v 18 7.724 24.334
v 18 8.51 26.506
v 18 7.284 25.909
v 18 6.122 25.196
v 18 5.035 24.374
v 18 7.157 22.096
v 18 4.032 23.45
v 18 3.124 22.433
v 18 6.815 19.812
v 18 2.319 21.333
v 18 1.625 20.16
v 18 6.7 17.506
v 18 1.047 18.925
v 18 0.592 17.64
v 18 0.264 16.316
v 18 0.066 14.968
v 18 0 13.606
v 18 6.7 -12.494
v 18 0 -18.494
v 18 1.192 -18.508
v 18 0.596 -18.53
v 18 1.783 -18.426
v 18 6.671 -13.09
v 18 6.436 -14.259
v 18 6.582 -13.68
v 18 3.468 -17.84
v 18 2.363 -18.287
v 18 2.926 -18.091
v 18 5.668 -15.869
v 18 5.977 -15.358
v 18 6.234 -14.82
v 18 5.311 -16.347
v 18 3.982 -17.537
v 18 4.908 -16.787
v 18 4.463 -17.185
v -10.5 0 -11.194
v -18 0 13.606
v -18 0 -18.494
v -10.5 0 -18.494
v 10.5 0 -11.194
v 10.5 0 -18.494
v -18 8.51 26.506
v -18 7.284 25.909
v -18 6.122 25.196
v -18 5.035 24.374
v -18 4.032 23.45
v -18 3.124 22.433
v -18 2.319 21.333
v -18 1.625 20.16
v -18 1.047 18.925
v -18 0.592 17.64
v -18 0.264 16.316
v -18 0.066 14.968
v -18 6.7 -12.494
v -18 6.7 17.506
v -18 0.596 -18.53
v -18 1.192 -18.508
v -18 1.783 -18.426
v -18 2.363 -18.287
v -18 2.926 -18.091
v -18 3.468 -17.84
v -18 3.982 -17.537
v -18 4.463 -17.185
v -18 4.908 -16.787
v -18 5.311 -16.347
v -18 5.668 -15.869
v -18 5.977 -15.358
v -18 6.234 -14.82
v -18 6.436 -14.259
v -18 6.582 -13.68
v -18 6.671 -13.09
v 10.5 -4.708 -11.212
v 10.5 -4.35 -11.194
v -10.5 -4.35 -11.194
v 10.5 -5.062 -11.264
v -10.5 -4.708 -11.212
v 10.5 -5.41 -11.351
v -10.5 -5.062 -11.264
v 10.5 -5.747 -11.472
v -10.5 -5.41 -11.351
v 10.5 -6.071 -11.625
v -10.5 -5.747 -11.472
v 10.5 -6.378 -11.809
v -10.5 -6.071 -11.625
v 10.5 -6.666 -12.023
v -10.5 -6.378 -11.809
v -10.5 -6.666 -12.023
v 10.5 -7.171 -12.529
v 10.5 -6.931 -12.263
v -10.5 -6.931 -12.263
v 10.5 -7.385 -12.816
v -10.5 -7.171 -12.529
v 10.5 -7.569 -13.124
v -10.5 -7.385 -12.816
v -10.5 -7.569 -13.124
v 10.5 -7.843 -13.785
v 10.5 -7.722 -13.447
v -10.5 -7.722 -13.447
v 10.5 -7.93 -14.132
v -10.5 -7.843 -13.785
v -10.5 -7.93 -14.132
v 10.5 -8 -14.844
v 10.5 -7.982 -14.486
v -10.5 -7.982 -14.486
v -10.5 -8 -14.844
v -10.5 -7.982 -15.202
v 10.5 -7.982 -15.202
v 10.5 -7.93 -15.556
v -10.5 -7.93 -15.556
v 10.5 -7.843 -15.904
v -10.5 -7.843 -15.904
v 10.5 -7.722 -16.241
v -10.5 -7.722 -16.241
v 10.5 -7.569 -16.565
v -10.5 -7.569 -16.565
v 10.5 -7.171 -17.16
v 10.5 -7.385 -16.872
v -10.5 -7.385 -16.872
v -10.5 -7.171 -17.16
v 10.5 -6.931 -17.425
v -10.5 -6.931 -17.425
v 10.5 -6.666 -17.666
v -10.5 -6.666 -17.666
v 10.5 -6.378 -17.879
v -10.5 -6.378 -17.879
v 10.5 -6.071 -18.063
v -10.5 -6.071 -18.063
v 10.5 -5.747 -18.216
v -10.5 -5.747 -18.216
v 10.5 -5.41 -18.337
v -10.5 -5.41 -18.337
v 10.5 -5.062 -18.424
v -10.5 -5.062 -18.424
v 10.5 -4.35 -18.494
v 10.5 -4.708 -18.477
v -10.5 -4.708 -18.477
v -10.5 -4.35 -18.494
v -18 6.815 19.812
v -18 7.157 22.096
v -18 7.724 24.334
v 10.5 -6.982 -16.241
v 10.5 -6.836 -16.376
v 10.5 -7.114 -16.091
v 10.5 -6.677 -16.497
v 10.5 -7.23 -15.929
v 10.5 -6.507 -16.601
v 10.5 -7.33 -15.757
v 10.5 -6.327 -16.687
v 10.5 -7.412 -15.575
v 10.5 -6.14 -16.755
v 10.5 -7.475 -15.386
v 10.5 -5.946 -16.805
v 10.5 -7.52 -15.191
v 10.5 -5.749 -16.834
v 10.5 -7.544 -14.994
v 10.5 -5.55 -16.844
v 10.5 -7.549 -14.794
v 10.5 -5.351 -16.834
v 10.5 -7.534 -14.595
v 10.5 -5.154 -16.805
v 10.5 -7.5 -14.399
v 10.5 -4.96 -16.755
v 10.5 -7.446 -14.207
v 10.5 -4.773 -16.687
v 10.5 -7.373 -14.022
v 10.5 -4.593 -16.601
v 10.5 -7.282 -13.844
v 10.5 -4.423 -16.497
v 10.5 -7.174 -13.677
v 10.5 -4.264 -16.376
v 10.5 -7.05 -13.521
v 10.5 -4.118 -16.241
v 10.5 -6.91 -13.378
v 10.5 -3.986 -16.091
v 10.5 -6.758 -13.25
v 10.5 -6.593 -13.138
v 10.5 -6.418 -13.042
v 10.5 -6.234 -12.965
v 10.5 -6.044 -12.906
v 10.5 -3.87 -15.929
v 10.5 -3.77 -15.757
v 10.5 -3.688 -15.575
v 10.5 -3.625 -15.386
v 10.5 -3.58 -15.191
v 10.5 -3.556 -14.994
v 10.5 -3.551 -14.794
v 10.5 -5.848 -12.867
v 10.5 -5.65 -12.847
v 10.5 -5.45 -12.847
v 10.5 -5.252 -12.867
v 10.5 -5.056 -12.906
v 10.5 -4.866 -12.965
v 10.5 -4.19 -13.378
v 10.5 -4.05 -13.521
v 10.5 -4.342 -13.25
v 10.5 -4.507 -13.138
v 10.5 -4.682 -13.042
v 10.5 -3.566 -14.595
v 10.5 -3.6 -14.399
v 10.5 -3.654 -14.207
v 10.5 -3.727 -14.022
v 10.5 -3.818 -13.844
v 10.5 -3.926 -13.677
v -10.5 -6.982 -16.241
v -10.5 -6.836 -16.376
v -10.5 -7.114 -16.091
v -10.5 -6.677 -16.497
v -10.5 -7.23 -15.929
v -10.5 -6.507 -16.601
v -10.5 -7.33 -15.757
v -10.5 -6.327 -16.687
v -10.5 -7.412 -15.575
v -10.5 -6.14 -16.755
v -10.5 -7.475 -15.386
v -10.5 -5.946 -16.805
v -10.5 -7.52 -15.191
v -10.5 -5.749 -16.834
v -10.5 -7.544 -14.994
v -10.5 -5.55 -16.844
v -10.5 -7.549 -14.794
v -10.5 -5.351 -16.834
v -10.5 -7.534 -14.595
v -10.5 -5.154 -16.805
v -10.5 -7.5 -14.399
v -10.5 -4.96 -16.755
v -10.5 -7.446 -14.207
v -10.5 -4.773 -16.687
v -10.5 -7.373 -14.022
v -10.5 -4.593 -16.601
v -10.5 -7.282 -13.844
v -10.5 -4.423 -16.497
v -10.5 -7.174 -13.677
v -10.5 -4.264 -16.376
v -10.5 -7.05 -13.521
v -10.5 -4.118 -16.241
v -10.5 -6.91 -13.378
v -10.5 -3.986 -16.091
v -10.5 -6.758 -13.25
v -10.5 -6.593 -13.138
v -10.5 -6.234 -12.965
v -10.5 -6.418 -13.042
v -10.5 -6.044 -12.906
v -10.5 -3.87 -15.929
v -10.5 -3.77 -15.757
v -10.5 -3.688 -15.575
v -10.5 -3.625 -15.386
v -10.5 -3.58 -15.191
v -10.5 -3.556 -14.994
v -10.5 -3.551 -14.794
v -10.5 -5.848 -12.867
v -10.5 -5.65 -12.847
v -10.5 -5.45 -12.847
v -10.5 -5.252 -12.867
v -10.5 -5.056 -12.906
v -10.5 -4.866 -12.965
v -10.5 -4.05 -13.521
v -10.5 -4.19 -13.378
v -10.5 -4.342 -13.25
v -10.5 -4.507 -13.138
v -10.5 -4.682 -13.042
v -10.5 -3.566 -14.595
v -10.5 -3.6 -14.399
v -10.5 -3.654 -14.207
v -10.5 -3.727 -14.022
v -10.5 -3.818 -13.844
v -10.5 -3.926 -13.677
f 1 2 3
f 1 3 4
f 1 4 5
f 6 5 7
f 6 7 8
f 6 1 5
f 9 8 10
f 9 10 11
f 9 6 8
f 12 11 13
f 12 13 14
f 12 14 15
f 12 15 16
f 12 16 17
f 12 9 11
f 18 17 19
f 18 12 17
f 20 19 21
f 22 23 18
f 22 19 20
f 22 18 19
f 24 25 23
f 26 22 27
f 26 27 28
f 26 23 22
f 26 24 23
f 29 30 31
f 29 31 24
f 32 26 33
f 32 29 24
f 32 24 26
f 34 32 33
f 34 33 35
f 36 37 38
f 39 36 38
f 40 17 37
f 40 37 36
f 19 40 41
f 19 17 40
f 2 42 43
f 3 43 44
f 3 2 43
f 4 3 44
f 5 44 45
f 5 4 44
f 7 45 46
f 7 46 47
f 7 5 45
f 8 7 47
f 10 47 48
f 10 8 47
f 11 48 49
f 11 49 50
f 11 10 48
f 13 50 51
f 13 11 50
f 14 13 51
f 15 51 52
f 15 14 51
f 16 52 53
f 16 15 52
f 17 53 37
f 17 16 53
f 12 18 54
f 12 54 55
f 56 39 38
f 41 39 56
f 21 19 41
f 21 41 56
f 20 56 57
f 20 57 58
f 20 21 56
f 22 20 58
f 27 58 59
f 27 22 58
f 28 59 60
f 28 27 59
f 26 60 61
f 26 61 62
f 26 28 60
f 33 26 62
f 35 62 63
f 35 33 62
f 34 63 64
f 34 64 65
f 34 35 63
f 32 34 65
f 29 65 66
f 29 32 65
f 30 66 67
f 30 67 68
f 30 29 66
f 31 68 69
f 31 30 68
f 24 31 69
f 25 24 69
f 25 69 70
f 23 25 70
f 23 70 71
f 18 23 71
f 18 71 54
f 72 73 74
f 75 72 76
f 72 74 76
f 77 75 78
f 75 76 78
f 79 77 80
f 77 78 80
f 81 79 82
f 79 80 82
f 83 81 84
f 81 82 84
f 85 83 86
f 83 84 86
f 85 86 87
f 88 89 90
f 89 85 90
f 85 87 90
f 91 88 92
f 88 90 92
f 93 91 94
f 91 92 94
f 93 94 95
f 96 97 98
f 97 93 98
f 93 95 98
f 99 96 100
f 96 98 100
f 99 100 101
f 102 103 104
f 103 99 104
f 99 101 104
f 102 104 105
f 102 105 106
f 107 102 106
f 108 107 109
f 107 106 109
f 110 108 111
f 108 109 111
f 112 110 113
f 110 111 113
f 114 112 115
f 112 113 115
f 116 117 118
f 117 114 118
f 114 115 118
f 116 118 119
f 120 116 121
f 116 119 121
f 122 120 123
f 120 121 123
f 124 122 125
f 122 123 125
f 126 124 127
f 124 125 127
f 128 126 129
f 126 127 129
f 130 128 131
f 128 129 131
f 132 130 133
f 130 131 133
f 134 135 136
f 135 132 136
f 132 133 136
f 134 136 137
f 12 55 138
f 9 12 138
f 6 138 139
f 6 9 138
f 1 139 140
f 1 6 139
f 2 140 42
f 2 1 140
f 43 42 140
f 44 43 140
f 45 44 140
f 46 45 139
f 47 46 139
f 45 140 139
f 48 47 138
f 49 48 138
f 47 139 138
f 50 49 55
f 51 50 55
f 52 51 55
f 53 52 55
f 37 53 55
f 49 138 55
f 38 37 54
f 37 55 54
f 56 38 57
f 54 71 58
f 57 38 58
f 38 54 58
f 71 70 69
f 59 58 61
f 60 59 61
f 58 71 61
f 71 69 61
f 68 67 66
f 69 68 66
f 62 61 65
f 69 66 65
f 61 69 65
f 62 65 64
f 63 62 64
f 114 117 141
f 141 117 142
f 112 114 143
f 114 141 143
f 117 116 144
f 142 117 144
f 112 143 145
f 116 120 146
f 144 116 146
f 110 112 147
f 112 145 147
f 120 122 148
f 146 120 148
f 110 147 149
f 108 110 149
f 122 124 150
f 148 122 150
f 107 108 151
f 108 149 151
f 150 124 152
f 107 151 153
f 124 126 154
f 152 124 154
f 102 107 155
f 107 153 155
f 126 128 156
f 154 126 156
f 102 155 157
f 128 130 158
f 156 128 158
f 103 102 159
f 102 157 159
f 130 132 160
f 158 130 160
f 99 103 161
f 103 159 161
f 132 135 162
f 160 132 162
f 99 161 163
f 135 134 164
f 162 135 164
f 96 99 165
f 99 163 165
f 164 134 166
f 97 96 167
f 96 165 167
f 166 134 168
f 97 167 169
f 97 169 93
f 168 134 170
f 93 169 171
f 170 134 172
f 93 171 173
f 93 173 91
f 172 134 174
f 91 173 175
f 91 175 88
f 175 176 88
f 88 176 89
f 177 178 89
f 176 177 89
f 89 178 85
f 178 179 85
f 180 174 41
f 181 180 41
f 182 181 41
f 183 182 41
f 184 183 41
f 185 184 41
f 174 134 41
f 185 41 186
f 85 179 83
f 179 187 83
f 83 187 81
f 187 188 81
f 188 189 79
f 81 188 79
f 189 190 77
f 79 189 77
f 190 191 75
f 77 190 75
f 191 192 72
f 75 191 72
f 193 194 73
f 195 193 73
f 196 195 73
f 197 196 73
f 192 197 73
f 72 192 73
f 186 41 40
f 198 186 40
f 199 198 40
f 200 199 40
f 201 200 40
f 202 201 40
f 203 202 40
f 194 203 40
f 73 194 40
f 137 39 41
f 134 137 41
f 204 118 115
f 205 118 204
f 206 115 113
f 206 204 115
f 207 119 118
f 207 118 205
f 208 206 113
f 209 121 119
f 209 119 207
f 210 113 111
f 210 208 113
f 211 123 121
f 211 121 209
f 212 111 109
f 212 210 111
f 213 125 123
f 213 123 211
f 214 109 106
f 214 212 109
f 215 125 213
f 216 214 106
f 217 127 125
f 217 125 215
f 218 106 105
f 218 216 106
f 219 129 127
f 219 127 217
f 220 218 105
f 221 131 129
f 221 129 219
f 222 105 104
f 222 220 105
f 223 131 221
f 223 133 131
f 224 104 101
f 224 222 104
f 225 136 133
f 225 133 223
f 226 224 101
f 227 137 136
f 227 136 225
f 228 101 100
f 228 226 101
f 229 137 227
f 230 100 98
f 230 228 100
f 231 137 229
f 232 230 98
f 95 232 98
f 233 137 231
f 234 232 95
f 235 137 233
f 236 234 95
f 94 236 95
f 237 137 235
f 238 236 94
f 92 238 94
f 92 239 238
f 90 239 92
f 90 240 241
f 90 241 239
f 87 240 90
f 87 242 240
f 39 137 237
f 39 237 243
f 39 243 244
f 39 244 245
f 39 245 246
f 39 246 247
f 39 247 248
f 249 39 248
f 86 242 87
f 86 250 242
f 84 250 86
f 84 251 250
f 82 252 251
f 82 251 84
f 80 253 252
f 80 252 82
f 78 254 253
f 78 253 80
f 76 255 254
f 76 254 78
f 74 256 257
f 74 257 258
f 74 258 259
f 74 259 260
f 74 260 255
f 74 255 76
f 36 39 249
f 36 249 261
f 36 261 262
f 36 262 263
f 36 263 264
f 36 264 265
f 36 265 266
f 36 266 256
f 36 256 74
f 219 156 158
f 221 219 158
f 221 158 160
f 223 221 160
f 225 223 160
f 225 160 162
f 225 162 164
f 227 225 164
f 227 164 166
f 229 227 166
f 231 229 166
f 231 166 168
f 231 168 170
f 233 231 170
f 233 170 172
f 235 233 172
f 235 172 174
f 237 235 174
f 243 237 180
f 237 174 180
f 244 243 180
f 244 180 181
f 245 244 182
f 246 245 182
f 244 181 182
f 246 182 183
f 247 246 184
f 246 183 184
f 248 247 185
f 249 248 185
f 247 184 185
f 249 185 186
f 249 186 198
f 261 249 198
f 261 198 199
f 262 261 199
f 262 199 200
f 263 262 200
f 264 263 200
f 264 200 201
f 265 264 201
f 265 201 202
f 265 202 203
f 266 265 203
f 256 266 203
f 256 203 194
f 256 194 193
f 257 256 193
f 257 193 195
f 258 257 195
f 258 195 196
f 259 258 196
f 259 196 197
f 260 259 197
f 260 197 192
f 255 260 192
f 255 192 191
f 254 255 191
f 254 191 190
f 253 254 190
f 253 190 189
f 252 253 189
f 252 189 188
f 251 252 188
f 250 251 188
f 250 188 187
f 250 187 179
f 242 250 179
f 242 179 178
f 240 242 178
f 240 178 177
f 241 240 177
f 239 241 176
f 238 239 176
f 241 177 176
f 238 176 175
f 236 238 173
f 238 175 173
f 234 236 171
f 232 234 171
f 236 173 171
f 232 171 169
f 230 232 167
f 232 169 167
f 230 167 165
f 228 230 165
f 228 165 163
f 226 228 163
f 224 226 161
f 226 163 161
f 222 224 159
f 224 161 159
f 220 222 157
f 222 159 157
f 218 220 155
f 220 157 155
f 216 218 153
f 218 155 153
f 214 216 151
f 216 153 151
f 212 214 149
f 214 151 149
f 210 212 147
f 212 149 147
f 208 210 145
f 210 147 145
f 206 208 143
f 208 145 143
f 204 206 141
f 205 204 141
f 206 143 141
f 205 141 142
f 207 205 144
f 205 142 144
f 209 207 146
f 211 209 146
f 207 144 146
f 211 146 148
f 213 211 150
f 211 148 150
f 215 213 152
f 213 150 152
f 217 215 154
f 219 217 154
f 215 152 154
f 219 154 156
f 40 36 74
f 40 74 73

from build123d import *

# Parameters (mm, degrees)
BOSS_EXTRUDE1_DEPTH = 18
SKETCH2_W           = 21
SKETCH2_H           = 7.3
BOSS_EXTRUDE2_DEPTH = 8
CUT_EXTRUDE1_DEPTH  = 29.5
SKETCH4_R           = 2
CUT_EXTRUDE2_DEPTH  = 29.5


with BuildPart() as part:
    # Sketch1 → Boss-Extrude1 (new body, symmetric)
    with BuildSketch(Plane(origin=(0, 0, 0), x_dir=(0, 0, -1), z_dir=(1, 0, 0))):
        with BuildLine():
            Line((-13.605837563, 0), (18.494162437, 0))
            ThreePointArc((18.494162437, 0), (16.991105843, 4.690546334), (12.494162437, 6.7))
            Line((12.494162437, 6.7), (-17.505837563, 6.7))
            ThreePointArc((-17.505837563, 6.7), (-22.095938325, 7.156985164), (-26.505837563, 8.51))
            ThreePointArc((-26.505837563, 8.51), (-21.332902013, 2.319144372), (-13.605837563, 0))
        make_face()
    extrude(amount=BOSS_EXTRUDE1_DEPTH, both=True)

    # Sketch2 → Boss-Extrude2 (add)
    with BuildSketch(Plane.XZ):
        with Locations((0, -14.844162437)):
            Rectangle(SKETCH2_W, SKETCH2_H)
    extrude(amount=BOSS_EXTRUDE2_DEPTH)

    # Sketch3 → Cut-Extrude1 (cut, through all)
    with BuildSketch(Plane.ZY.offset(10.5)):
        with BuildLine():
            Line((-18.494162437, -4.35), (-18.494162437, -8))
            Line((-18.494162437, -8), (-14.844162437, -8))
            ThreePointArc((-14.844162437, -8), (-17.425102188, -6.930939751), (-18.494162437, -4.35))
        make_face()
        with BuildLine():
            ThreePointArc((-11.194162437, -4.35), (-12.263222685, -6.930939751), (-14.844162437, -8))
            Line((-14.844162437, -8), (-11.194162437, -8))
            Line((-11.194162437, -8), (-11.194162437, -4.35))
        make_face()
    extrude(amount=-CUT_EXTRUDE1_DEPTH, mode=Mode.SUBTRACT)

    # Sketch4 → Cut-Extrude2 (cut, through all)
    with BuildSketch(Plane(origin=(10.5, 0, 0), x_dir=(0, 0, -1), z_dir=(1, 0, 0))):
        with Locations((14.844162437, -5.55)):
            Circle(SKETCH4_R)
    extrude(amount=-CUT_EXTRUDE2_DEPTH, mode=Mode.SUBTRACT)


solid = part.part
